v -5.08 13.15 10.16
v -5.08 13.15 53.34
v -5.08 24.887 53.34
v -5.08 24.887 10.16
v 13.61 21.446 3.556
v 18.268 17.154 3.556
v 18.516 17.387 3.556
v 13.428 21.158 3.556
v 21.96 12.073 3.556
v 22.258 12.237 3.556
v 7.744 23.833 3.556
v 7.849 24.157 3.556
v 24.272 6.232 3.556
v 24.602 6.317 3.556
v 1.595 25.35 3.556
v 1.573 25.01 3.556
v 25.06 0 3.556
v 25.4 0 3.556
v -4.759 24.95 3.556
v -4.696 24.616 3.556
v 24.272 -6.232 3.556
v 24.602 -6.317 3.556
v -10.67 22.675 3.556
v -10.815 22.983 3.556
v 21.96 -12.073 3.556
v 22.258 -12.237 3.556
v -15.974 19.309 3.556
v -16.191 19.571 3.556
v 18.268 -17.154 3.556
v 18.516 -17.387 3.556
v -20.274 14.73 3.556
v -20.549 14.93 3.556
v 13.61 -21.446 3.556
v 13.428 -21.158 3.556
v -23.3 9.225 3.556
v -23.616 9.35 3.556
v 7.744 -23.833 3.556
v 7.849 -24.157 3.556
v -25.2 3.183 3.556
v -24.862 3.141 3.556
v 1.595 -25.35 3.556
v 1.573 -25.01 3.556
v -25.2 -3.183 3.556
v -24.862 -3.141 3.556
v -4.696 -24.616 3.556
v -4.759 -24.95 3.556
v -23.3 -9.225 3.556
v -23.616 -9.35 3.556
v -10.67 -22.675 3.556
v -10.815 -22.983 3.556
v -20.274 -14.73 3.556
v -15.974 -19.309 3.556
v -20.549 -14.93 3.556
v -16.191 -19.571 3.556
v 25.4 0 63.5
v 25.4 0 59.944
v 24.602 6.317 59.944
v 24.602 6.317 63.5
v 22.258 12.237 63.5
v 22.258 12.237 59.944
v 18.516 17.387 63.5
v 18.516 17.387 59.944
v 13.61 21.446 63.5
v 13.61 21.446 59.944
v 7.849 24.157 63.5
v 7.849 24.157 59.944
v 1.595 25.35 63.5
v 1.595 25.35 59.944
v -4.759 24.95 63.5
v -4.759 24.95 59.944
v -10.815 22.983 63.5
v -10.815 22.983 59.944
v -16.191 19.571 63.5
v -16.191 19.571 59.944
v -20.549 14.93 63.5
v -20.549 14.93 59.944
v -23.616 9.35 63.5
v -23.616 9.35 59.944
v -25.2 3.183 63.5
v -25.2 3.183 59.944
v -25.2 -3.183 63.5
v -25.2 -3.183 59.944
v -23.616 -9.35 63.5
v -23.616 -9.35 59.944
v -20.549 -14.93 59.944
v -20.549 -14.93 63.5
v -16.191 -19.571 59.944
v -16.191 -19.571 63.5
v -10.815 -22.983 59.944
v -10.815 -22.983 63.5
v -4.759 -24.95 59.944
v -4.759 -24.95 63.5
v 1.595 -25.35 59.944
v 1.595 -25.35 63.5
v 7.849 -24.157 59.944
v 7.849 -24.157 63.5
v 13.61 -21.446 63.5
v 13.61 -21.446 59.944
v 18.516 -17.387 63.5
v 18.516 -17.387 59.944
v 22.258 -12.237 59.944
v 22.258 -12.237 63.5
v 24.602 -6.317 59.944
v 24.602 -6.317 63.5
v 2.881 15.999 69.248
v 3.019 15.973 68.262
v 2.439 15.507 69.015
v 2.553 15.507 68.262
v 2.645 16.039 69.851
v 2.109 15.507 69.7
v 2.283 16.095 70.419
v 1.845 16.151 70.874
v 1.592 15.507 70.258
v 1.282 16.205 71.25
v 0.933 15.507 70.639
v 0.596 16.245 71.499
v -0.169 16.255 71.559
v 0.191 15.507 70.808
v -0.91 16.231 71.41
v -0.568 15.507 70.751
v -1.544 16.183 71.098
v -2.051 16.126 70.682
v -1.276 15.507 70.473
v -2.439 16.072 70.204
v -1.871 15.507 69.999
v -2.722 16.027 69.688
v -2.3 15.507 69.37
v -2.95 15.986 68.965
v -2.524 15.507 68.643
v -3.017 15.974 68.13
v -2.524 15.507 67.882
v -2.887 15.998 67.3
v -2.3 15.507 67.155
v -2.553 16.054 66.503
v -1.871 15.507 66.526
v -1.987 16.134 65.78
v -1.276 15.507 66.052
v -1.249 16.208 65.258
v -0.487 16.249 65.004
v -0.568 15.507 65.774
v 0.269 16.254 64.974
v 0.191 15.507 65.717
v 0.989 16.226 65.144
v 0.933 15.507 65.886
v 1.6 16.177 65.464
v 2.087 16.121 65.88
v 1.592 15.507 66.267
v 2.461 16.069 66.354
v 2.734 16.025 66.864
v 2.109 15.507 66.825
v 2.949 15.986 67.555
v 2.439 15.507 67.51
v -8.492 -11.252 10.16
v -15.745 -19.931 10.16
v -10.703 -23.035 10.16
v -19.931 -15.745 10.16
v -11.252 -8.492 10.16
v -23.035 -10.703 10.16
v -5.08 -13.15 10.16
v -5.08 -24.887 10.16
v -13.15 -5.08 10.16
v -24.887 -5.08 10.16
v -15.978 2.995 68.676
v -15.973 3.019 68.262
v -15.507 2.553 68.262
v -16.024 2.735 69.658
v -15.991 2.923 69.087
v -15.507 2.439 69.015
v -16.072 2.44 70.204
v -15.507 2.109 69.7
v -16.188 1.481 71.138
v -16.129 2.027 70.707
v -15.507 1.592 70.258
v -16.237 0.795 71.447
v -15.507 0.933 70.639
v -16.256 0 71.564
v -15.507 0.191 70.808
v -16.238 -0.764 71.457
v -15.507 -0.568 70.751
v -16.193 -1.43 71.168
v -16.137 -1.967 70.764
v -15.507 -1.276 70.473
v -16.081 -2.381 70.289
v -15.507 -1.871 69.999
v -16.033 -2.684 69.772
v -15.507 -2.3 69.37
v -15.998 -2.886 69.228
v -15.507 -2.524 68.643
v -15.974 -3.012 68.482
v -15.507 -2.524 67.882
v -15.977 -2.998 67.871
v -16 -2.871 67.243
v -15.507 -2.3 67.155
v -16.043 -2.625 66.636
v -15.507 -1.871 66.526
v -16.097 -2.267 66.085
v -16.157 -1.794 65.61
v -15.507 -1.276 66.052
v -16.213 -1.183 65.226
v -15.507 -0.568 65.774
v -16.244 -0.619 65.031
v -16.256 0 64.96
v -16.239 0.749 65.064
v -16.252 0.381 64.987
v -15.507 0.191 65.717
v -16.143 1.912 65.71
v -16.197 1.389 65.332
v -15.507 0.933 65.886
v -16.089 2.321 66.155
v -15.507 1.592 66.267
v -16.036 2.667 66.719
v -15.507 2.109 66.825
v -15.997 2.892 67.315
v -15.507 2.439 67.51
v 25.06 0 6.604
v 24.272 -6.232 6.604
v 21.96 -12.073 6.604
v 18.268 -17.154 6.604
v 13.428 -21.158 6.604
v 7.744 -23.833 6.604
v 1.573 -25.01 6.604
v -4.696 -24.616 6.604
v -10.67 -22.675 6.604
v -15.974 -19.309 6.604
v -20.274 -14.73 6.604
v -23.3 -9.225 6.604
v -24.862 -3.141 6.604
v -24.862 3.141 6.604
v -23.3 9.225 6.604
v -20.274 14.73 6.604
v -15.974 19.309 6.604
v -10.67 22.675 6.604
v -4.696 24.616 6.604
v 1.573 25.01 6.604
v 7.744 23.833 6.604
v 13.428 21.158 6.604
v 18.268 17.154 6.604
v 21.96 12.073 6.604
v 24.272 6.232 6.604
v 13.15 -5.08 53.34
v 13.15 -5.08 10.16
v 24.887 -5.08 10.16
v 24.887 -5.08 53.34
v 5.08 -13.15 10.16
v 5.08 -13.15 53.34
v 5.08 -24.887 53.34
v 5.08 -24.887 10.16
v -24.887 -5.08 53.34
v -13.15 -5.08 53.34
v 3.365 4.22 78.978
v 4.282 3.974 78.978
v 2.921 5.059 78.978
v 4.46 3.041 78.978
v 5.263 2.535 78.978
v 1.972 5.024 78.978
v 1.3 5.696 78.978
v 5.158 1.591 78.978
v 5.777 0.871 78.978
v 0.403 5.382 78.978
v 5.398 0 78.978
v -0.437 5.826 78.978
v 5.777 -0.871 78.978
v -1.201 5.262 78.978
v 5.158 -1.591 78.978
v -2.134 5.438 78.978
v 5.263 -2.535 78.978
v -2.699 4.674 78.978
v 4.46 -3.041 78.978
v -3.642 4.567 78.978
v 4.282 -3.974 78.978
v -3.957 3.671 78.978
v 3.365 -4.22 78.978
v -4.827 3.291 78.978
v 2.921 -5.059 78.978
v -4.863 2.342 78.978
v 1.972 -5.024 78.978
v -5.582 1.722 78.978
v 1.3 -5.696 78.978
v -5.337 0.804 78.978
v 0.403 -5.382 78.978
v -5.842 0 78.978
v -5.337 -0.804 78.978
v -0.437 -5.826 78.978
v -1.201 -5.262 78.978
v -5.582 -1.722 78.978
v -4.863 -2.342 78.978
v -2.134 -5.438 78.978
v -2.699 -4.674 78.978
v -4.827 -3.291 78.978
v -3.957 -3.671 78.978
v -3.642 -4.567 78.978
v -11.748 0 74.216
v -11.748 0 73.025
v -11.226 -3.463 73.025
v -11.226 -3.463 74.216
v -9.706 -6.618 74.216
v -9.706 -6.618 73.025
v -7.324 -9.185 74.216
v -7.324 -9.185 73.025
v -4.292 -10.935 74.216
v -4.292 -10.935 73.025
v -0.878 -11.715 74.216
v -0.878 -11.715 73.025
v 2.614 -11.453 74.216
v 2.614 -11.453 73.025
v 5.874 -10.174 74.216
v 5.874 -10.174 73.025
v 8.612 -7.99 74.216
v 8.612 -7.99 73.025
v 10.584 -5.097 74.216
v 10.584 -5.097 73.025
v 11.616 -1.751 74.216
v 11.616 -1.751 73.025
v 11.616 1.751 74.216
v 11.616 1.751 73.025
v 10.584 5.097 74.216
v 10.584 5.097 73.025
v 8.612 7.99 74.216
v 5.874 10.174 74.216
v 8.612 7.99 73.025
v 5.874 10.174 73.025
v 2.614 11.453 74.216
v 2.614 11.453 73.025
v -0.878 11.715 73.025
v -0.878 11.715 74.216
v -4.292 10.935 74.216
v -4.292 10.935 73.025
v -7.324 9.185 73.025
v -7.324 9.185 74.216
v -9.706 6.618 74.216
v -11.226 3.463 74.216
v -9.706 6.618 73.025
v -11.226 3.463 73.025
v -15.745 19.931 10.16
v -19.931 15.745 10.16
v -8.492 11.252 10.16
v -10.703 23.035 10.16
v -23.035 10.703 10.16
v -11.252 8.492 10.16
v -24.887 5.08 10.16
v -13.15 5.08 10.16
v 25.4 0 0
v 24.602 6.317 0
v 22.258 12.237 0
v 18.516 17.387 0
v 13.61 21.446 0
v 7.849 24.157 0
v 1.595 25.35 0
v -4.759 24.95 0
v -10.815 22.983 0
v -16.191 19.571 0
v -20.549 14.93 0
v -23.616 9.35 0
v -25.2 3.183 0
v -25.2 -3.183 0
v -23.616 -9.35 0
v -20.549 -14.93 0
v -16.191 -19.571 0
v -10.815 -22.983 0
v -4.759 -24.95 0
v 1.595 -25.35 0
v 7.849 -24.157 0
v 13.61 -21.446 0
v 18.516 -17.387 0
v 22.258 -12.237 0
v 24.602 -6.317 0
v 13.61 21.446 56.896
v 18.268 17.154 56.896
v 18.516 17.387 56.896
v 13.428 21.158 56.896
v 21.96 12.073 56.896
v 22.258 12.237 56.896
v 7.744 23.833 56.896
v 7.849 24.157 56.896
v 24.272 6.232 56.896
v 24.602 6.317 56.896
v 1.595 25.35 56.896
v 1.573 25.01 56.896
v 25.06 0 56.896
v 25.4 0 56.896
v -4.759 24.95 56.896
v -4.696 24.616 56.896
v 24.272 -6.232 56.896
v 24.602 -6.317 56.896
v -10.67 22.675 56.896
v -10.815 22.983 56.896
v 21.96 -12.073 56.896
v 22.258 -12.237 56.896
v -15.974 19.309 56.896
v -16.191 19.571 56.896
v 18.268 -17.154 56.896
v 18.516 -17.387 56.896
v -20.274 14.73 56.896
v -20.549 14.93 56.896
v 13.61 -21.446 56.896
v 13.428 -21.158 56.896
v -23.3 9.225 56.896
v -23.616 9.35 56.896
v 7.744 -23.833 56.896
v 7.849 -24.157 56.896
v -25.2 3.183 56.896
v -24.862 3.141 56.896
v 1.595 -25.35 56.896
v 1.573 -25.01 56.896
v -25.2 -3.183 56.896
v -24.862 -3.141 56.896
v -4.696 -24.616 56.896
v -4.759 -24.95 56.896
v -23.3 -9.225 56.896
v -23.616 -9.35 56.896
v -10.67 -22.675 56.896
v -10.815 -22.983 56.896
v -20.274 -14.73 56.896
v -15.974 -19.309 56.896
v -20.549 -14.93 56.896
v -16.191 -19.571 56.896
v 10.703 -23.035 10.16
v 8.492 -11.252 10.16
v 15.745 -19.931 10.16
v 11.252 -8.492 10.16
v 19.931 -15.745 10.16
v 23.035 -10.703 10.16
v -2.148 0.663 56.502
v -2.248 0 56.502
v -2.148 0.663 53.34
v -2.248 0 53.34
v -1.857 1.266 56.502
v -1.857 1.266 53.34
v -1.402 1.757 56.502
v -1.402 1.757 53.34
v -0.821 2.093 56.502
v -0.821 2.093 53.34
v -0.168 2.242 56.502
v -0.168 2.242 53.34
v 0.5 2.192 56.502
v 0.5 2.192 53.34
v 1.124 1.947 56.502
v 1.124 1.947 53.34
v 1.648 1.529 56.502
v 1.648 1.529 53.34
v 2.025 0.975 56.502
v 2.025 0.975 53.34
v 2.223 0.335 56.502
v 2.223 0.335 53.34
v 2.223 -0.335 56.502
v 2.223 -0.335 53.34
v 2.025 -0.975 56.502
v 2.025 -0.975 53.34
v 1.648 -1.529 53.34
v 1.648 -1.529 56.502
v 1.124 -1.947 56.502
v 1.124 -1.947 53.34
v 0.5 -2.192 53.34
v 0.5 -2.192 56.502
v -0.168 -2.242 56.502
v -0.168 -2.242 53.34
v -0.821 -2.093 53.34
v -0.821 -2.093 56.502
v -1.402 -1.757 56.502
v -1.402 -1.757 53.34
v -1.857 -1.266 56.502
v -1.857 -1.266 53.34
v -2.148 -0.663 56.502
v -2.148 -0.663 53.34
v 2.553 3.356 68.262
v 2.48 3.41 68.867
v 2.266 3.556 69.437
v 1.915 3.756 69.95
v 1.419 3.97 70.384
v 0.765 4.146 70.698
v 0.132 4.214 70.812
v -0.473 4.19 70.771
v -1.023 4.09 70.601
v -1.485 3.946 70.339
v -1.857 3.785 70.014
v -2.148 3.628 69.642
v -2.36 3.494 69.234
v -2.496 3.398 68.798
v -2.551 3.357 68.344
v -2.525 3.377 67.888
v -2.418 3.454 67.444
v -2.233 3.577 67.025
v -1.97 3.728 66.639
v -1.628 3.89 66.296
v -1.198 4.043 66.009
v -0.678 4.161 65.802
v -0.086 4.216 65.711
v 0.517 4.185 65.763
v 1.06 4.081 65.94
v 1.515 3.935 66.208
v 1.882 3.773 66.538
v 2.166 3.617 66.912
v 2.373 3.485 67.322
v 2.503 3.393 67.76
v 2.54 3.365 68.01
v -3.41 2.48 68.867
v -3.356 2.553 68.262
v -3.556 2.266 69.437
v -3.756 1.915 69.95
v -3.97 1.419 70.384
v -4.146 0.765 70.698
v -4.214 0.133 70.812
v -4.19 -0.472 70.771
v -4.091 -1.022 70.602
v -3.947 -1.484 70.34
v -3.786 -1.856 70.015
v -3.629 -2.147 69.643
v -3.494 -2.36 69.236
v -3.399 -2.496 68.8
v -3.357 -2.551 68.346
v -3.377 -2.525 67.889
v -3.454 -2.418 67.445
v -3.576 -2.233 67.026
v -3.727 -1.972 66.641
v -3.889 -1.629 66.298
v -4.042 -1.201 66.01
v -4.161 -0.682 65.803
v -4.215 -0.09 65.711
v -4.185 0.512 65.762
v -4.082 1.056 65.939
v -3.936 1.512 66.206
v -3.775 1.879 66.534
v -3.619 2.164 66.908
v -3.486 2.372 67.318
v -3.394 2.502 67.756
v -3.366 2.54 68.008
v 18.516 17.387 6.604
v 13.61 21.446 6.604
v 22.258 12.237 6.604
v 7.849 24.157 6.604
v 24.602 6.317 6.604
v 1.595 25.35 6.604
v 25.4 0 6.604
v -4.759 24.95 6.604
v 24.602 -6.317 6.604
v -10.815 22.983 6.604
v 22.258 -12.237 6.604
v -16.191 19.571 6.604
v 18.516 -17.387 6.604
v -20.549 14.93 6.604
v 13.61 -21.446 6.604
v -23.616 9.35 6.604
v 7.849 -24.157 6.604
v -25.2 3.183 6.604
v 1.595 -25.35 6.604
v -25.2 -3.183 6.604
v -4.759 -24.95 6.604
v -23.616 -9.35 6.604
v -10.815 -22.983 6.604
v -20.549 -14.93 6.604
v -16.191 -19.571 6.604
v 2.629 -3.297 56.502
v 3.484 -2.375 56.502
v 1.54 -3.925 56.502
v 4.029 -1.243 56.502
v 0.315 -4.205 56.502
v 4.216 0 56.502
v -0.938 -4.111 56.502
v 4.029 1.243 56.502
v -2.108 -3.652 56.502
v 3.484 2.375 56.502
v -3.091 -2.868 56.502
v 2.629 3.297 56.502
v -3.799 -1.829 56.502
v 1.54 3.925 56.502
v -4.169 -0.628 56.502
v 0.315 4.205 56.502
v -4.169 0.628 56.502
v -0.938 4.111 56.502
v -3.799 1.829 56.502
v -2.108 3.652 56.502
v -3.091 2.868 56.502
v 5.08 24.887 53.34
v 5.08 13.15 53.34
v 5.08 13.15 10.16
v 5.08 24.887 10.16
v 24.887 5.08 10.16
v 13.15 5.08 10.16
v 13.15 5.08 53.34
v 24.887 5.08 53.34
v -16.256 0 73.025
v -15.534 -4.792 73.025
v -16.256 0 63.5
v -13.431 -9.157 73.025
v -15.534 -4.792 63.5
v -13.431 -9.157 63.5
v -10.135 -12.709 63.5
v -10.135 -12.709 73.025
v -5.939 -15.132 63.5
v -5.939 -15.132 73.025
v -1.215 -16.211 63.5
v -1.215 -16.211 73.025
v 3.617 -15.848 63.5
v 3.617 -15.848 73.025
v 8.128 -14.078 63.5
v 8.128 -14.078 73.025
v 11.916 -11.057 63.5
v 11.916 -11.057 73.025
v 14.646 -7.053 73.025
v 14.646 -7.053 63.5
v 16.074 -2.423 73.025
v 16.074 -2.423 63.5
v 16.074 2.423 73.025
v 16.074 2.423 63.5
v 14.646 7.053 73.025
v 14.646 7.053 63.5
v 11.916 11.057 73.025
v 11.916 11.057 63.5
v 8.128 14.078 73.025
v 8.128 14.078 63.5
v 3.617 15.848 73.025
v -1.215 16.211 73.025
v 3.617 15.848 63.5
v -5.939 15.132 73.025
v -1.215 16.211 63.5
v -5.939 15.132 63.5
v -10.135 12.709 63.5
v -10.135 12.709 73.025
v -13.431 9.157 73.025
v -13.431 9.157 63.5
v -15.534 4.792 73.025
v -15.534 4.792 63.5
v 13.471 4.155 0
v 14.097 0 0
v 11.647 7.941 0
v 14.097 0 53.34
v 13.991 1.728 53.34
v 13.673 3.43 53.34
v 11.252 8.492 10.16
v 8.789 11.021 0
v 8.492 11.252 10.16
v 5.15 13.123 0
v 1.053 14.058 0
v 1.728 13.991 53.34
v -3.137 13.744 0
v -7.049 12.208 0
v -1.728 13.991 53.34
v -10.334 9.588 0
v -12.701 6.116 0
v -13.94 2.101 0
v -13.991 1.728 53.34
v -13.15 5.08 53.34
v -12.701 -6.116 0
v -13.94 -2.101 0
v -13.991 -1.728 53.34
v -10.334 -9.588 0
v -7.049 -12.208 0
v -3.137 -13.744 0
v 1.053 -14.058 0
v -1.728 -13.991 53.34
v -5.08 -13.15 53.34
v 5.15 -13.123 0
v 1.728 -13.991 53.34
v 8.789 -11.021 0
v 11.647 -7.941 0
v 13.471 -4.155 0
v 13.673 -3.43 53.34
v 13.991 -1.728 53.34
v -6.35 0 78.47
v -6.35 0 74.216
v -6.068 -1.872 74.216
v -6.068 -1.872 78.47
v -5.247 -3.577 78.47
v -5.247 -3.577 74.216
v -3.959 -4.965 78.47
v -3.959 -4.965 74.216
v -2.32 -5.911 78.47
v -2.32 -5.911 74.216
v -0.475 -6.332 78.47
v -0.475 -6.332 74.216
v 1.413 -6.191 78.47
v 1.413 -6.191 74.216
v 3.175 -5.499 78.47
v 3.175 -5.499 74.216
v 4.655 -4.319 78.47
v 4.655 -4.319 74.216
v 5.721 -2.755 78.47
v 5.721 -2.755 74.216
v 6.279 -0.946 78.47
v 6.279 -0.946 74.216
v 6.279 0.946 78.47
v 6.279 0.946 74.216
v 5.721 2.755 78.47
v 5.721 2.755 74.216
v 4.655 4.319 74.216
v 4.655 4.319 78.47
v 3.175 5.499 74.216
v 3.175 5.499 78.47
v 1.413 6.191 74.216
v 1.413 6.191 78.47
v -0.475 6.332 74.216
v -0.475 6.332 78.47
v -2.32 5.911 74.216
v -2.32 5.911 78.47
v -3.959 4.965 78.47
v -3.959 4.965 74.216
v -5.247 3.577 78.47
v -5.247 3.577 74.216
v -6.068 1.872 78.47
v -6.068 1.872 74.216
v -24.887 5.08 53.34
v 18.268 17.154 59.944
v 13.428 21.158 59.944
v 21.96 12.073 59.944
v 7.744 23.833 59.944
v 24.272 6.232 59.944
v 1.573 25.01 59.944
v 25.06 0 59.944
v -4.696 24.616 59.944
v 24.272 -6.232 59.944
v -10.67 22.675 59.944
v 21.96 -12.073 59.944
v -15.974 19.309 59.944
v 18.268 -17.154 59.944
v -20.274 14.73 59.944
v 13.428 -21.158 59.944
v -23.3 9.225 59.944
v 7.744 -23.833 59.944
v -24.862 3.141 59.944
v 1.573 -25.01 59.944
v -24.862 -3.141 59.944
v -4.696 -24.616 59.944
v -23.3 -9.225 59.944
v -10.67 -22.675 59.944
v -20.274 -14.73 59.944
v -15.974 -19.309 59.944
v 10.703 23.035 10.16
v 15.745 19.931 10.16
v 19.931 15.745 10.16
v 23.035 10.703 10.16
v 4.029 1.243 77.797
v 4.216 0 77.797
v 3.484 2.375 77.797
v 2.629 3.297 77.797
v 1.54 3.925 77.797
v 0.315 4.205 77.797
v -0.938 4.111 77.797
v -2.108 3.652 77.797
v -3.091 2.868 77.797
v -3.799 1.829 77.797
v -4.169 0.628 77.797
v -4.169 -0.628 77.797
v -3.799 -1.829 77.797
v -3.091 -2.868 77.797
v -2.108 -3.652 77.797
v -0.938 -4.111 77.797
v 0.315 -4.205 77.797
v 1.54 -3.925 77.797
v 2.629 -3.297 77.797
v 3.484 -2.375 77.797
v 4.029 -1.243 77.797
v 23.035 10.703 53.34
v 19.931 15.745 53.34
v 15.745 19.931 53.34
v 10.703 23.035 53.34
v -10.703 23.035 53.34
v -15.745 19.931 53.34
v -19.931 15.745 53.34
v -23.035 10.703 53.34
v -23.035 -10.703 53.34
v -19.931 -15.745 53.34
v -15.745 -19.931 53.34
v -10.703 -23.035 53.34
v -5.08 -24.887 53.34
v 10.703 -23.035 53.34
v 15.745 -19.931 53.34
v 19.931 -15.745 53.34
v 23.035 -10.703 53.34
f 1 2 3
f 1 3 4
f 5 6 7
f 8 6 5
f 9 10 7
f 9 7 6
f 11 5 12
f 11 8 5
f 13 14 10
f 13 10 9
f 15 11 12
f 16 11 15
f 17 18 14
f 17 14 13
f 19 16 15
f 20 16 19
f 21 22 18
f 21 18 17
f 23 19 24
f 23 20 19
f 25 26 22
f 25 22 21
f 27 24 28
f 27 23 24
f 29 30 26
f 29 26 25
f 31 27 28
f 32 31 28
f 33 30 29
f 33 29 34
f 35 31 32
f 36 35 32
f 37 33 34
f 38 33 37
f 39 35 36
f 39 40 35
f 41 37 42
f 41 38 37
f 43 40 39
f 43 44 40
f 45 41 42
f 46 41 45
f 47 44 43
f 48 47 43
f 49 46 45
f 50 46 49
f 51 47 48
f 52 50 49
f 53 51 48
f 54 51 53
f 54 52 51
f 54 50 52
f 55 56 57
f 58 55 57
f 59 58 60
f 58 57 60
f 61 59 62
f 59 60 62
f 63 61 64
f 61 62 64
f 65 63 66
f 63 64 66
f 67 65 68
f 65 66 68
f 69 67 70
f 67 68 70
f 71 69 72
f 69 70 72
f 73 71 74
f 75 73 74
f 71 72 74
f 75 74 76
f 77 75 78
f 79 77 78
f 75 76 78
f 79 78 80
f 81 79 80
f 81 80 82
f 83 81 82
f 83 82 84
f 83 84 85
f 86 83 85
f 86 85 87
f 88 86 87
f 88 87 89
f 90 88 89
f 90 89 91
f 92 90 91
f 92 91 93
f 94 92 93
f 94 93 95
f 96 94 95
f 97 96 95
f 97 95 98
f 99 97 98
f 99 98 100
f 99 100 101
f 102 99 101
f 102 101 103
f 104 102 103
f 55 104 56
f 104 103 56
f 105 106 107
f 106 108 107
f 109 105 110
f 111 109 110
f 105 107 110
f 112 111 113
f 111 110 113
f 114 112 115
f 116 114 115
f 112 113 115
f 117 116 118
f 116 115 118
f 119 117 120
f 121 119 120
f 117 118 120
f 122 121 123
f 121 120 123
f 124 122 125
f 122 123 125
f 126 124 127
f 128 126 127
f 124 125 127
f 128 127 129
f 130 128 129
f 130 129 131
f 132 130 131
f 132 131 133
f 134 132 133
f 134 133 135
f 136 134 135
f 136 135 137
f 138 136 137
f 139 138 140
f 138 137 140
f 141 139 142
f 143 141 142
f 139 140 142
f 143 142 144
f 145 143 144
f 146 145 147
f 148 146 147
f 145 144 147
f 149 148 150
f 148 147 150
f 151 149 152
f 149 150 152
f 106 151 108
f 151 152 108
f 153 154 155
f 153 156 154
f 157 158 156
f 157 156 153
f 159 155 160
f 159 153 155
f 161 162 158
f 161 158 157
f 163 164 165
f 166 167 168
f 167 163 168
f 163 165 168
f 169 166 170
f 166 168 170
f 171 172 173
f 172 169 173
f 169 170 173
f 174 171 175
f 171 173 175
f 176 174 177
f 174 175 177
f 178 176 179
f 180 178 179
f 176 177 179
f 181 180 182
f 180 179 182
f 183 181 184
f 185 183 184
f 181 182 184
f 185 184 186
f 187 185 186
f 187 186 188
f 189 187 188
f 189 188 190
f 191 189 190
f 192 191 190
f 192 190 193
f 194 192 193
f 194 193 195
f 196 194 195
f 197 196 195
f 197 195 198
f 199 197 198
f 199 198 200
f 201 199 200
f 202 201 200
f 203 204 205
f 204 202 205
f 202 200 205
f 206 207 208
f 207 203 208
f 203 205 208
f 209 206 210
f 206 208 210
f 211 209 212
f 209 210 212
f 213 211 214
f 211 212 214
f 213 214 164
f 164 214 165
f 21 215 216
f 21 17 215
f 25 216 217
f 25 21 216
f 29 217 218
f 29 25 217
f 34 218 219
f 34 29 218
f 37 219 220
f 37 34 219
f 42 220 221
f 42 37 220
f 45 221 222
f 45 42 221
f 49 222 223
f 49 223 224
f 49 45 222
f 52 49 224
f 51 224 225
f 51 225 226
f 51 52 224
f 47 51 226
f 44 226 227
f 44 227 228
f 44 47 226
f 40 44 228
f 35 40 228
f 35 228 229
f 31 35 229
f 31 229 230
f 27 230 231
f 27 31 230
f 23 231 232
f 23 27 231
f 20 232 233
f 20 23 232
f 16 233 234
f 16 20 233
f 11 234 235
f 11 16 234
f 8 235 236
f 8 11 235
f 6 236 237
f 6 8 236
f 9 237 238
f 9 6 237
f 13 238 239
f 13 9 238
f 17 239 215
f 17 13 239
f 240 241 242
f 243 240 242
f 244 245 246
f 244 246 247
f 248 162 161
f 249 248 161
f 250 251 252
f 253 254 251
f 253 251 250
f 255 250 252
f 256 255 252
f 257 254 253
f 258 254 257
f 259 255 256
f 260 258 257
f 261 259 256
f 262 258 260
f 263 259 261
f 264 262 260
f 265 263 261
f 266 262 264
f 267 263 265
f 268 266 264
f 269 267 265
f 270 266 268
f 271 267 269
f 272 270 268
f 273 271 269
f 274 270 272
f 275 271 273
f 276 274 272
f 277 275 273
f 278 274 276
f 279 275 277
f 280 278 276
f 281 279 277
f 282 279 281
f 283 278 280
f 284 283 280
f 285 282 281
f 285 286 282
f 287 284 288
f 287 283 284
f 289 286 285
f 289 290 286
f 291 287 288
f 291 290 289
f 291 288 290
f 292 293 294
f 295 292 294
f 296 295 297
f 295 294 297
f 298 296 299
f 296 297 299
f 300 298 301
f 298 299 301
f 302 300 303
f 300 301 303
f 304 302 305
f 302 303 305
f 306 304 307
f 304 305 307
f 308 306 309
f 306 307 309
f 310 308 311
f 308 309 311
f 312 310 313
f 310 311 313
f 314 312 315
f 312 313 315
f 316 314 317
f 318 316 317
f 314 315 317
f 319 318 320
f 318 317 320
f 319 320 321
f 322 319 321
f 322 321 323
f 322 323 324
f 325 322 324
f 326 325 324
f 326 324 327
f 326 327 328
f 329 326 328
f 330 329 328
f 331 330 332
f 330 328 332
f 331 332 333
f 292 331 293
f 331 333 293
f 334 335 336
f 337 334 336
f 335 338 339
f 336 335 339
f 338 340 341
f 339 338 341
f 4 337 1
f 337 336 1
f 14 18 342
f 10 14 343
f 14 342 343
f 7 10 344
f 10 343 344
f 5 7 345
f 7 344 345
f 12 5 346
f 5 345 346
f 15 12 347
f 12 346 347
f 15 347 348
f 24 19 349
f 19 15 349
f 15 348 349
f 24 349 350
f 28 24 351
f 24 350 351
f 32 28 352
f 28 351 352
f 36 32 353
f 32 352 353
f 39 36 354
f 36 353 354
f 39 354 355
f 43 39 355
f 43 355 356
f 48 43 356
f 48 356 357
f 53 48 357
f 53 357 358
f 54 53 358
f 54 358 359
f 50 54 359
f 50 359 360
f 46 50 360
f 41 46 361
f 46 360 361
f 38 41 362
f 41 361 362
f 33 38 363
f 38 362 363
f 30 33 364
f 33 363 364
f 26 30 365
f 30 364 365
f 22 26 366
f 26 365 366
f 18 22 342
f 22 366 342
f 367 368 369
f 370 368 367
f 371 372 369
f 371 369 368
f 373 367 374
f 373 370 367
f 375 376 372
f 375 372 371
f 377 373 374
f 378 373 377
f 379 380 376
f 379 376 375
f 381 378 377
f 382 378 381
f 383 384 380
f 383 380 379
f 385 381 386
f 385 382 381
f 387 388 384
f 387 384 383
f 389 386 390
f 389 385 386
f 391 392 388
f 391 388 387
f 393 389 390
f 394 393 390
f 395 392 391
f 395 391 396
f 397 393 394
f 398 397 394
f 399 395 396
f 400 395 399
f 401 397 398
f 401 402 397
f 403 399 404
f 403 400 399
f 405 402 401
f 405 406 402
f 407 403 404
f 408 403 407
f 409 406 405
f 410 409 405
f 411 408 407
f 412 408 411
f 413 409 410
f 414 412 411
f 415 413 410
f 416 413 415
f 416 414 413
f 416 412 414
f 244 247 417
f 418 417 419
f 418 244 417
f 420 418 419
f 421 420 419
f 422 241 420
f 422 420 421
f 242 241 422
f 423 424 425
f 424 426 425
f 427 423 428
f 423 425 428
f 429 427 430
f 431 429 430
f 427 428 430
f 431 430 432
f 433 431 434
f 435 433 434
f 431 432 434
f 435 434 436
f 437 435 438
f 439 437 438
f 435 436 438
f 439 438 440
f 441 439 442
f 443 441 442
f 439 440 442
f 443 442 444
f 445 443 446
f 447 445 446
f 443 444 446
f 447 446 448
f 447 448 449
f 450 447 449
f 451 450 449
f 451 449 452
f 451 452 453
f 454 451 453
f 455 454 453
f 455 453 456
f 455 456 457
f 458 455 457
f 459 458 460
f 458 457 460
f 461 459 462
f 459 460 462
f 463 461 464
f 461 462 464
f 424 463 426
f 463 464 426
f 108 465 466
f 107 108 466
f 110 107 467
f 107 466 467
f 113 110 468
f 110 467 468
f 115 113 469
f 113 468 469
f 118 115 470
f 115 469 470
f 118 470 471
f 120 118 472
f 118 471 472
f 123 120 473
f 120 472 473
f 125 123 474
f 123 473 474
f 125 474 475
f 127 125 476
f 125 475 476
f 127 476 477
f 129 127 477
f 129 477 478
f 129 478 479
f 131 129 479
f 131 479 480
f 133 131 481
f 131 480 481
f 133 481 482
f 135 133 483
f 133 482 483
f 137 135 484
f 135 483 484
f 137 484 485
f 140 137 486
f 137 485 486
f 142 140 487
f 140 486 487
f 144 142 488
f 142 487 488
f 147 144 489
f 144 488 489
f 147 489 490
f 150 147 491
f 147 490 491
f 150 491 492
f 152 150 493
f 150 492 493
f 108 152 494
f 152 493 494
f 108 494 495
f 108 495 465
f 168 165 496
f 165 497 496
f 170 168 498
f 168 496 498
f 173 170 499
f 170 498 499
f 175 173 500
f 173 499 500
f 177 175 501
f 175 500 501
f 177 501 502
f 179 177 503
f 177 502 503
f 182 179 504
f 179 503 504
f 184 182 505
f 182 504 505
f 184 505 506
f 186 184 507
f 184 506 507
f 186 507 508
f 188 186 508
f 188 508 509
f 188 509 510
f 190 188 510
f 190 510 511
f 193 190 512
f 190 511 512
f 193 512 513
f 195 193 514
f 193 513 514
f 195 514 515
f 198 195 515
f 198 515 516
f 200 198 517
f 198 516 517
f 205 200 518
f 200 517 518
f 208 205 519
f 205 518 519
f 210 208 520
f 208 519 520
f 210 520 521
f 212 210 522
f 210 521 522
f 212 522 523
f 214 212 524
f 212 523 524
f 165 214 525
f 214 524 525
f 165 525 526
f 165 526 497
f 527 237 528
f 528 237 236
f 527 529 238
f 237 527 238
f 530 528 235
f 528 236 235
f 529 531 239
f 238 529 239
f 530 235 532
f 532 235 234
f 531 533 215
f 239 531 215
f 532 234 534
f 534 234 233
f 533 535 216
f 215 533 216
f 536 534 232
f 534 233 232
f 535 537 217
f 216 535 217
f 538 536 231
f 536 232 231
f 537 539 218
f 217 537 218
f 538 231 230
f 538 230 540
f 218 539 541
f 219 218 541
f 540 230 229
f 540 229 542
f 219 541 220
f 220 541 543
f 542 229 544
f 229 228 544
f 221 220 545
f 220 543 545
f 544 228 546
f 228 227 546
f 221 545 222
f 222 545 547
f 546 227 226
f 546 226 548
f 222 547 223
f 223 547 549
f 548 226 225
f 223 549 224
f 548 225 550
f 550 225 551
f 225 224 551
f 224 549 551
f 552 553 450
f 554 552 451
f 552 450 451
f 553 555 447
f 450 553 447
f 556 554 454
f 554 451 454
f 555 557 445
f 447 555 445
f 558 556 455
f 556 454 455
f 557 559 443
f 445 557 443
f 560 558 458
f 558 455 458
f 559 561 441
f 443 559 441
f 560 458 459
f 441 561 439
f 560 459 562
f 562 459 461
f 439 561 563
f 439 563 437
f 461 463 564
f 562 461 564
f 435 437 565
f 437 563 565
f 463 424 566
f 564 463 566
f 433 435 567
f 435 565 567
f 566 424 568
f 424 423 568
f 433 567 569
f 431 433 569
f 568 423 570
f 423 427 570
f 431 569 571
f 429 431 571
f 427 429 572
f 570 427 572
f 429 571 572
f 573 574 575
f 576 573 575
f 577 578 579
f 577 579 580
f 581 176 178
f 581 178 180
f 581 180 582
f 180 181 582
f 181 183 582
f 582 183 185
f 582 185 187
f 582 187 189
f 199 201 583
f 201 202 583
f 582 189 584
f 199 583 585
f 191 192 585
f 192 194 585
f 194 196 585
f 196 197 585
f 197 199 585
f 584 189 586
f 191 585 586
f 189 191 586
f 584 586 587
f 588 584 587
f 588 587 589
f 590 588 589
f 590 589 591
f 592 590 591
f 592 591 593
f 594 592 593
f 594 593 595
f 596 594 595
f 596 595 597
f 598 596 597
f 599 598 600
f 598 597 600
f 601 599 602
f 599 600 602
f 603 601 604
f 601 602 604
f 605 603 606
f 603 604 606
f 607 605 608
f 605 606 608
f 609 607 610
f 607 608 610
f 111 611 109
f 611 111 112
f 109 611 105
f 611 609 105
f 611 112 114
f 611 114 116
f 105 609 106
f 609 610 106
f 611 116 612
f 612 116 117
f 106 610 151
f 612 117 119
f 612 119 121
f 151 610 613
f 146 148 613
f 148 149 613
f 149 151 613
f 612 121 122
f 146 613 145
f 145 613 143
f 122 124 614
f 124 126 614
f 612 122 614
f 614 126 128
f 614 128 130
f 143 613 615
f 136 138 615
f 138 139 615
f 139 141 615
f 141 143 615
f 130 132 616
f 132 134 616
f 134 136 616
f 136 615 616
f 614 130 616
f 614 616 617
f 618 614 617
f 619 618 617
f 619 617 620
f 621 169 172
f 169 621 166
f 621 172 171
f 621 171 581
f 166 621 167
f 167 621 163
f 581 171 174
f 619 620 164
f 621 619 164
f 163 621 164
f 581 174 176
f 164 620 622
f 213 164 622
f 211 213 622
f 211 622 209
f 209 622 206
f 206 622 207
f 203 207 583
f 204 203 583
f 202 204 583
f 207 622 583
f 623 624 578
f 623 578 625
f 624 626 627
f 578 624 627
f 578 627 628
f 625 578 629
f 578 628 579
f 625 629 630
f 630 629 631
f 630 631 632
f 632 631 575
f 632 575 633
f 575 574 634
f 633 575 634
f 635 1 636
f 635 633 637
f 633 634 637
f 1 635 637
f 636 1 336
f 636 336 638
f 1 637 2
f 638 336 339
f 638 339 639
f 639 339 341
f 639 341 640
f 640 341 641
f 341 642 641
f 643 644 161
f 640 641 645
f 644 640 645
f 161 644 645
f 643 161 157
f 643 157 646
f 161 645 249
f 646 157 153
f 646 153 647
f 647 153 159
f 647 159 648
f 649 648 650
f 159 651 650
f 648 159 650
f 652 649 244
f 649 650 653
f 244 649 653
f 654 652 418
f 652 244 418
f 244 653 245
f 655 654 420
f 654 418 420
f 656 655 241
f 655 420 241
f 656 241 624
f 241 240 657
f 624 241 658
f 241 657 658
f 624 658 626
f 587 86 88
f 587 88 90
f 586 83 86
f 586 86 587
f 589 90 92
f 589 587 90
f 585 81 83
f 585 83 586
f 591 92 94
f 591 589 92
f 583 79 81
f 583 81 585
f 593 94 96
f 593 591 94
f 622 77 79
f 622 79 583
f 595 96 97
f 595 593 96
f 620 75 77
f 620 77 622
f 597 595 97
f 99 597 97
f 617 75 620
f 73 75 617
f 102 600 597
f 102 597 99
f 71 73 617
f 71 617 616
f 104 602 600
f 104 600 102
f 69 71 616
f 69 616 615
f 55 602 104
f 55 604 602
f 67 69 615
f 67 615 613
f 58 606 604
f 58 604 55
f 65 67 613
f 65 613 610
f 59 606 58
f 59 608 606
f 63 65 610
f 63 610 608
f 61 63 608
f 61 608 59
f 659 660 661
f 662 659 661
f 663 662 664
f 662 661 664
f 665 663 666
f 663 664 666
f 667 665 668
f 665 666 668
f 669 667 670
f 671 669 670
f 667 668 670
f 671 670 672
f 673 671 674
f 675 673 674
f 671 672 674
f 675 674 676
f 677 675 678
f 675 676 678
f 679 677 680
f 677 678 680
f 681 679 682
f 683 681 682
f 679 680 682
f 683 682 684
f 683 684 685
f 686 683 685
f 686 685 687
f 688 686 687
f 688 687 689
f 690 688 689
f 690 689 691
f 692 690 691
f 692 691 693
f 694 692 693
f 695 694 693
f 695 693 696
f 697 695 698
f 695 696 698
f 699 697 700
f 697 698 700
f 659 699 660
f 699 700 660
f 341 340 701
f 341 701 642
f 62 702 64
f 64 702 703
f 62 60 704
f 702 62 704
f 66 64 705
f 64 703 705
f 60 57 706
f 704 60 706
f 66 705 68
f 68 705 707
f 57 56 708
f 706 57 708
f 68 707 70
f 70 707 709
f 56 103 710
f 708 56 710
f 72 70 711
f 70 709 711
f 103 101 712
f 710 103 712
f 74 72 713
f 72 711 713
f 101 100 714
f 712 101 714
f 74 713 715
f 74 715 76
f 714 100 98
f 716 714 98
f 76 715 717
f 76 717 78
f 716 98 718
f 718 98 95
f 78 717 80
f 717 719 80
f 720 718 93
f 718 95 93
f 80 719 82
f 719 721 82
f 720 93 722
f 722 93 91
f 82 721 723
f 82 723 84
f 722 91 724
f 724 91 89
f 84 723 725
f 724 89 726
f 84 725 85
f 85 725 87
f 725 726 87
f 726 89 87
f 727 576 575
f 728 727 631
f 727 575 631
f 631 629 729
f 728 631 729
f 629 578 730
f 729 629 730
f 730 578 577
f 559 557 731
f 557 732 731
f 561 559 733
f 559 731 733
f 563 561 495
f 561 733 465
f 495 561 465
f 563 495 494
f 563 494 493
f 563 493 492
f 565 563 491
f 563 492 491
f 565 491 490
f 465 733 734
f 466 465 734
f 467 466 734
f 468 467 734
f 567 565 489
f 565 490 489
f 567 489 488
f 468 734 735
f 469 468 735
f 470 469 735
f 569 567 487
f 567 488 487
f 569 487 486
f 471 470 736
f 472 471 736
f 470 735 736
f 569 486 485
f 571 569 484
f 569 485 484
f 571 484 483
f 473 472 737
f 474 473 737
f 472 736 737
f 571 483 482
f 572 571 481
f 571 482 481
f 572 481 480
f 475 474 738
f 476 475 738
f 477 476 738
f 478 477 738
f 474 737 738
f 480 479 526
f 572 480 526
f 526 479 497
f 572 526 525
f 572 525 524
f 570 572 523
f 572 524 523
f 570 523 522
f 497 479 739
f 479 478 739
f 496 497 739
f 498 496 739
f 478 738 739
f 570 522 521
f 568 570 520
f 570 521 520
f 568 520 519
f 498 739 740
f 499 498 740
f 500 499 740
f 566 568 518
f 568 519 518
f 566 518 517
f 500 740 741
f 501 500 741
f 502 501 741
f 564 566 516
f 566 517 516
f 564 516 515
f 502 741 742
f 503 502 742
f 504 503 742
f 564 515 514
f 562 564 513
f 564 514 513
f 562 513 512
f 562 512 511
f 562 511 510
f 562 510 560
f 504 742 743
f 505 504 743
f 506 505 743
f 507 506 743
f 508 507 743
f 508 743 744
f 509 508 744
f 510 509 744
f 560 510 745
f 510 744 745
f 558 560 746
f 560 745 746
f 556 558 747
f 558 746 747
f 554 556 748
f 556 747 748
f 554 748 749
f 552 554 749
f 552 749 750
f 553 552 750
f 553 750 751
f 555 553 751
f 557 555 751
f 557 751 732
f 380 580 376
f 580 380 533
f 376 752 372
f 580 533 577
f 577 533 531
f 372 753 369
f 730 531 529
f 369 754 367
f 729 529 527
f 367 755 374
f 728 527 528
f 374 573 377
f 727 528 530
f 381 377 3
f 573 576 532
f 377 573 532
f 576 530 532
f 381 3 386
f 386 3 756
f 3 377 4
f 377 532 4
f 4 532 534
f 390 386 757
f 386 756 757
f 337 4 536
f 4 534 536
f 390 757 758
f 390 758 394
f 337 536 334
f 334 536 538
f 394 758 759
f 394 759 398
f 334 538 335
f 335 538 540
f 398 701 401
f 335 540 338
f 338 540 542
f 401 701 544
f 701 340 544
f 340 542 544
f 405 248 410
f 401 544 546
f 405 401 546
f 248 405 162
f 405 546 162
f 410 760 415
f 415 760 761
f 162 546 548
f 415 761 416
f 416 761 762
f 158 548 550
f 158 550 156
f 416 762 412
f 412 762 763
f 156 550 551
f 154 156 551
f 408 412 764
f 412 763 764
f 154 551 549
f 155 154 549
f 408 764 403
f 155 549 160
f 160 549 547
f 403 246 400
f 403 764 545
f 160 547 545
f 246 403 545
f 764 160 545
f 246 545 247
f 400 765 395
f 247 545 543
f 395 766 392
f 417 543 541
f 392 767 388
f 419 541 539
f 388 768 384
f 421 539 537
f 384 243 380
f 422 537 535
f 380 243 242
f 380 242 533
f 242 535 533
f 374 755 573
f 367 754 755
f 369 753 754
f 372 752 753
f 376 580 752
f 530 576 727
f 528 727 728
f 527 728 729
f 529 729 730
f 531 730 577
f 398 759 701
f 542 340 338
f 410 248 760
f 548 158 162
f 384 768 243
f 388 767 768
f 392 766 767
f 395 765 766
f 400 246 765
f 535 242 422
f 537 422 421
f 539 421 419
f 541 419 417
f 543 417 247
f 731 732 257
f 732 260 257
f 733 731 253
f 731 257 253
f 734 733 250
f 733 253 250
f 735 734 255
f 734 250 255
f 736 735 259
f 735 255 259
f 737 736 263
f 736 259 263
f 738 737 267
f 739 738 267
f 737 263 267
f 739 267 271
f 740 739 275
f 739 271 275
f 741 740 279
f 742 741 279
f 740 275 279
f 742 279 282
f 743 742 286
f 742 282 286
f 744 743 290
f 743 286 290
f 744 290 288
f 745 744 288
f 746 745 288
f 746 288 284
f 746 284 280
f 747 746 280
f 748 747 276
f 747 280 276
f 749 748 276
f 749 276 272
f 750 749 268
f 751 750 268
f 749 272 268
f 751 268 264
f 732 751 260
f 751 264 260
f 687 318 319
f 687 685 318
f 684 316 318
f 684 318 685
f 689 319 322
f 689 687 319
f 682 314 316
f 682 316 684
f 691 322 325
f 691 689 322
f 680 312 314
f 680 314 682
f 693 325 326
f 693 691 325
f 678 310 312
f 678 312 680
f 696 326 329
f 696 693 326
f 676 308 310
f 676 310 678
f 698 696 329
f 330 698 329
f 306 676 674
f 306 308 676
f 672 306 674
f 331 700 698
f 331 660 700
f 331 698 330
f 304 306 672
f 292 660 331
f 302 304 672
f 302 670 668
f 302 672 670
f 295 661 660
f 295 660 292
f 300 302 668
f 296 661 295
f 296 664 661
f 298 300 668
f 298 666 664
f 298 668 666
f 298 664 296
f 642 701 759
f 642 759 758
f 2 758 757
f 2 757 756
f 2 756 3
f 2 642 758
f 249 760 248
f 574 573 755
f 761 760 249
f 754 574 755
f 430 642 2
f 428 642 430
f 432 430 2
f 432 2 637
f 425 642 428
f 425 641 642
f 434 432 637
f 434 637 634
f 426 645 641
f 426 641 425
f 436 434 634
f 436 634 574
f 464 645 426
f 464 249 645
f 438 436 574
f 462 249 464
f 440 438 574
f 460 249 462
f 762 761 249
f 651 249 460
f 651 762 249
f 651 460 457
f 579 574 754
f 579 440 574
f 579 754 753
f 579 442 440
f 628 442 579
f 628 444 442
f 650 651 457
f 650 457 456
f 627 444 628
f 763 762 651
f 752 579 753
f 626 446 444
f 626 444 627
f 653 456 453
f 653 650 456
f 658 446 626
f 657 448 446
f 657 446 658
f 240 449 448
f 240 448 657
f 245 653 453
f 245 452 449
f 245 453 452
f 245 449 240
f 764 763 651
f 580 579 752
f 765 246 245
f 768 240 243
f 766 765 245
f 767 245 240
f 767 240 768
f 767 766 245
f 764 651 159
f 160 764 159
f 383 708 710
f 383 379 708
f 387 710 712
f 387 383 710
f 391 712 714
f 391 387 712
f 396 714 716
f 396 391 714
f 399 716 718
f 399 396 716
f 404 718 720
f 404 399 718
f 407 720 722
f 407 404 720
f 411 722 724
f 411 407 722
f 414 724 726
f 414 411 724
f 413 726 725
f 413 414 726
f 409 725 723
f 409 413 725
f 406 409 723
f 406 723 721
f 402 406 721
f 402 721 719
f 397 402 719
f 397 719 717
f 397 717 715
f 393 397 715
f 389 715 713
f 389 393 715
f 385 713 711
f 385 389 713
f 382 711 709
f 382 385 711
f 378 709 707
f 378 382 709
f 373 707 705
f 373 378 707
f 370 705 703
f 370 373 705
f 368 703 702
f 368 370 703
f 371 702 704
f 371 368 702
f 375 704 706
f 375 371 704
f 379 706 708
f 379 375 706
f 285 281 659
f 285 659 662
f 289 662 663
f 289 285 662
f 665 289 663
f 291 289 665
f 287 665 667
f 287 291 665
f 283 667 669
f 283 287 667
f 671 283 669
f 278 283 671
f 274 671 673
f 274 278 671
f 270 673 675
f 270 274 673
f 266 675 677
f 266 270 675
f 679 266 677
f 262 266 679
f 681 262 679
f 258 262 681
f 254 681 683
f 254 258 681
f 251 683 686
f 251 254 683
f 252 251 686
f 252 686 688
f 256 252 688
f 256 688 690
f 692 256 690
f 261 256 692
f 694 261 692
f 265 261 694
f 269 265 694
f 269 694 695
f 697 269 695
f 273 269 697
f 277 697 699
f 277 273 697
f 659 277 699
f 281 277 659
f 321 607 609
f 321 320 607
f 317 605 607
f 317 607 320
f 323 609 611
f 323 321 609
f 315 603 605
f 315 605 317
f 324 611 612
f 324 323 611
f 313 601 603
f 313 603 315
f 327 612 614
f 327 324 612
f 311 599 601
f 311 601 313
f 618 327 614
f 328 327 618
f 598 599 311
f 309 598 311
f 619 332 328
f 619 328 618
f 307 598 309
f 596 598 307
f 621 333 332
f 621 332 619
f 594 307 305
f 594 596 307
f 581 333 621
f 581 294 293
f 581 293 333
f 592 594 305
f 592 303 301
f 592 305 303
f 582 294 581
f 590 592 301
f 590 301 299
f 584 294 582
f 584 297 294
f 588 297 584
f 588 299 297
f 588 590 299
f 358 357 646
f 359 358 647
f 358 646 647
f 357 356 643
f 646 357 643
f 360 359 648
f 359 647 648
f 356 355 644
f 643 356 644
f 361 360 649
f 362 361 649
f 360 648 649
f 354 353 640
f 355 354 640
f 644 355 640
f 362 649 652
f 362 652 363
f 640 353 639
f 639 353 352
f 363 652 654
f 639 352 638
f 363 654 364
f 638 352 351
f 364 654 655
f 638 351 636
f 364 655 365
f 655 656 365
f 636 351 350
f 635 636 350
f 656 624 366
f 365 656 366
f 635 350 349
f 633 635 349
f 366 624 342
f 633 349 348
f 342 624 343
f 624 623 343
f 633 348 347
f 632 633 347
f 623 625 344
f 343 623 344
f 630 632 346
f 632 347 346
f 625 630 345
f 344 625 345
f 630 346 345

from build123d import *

# Parameters (mm, degrees)
SKETCH1_R                                      = 25.4
BOSS_EXTRUDE1_DEPTH                            = 63.5
SKETCH2_R                                      = 14.097
CUT_EXTRUDE1_DEPTH                             = 63.5
SKETCH4_W                                      = 20.32
SKETCH4_H                                      = 43.18
CUT_EXTRUDE3_DEPTH                             = 75.876167103
SKETCH8_R                                      = 14.097
BOSS_EXTRUDE3_DEPTH                            = 10.16
SKETCH10_R                                     = 16.256
BOSS_EXTRUDE4_DEPTH                            = 9.525
SKETCH26_R                                     = 11.7475
BOSS_EXTRUDE8_DEPTH                            = 1.190625
SKETCH11_R                                     = 6.35
BOSS_EXTRUDE5_DEPTH                            = 4.7625
CBORE_FOR_8_SOCKET_HEAD_CAP_SCREW1_D           = 4.4958
CBORE_FOR_8_SOCKET_HEAD_CAP_SCREW1_CBORE_D     = 7.9375
CBORE_FOR_8_SOCKET_HEAD_CAP_SCREW1_CBORE_DEPTH = 22.475825
SKETCH17_W                                     = 3.048
SKETCH17_H                                     = 0.508
CIRPATTERN1_COUNT                              = 2
CIRPATTERN1_ANGLE                              = 90
CHAMFER1_SIZE                                  = 0.508


# Read off the part's stored shape, not the designer's step: 1/4-20 Tapped Hole1, 3/8-24 Tapped Hole1
with BuildPart() as part:
    # Sketch1 → Boss-Extrude1 (new body)
    with BuildSketch(Plane.XY):
        Circle(SKETCH1_R)
    extrude(amount=BOSS_EXTRUDE1_DEPTH)

    # Sketch2 → Cut-Extrude1 (cut)
    with BuildSketch(Plane.XY.offset(63.5)):
        Circle(SKETCH2_R)
    extrude(amount=-CUT_EXTRUDE1_DEPTH, mode=Mode.SUBTRACT)

    # Sketch4 → Cut-Extrude3 (cut, through all)
    with BuildSketch(Plane(origin=(0, 5.08, 0), x_dir=(1, 0, 0), z_dir=(0, 1, 0))):
        with Locations((-15.24, -31.75)):
            Rectangle(SKETCH4_W, SKETCH4_H)
        with Locations((15.24, -31.75)):
            Rectangle(SKETCH4_W, SKETCH4_H)
    cut_extrude3 = extrude(amount=CUT_EXTRUDE3_DEPTH, mode=Mode.SUBTRACT)

    # Mirror1: Cut-Extrude3 across plane
    add(cut_extrude3.mirror(Plane.ZX), mode=Mode.SUBTRACT)

    # Sketch8 → Boss-Extrude3 (add)
    with BuildSketch(Plane.XY.offset(63.5)):
        Circle(SKETCH8_R)
    extrude(amount=-BOSS_EXTRUDE3_DEPTH)

    # Sketch10 → Boss-Extrude4 (add)
    with BuildSketch(Plane.XY.offset(63.5)):
        with Locations(Location((0, 0, 0), (0, 0, 180))):
            Circle(SKETCH10_R)
    extrude(amount=BOSS_EXTRUDE4_DEPTH)

    # Sketch26 → Boss-Extrude8 (add)
    with BuildSketch(Plane.XY.offset(73.025)):
        with Locations(Location((0, 0, 0), (0, 0, 180))):
            Circle(SKETCH26_R)
    extrude(amount=BOSS_EXTRUDE8_DEPTH)

    # Sketch11 → Boss-Extrude5 (add)
    with BuildSketch(Plane.XY.offset(74.215625)):
        with Locations(Location((0, 0, 0), (0, 0, 180))):
            Circle(SKETCH11_R)
    extrude(amount=BOSS_EXTRUDE5_DEPTH)

    # CBORE for #8 Socket Head Cap Screw1 (through all)
    with Locations(Plane.XY.offset(78.978125)):
        with Locations((0, 0)):
            CounterBoreHole(CBORE_FOR_8_SOCKET_HEAD_CAP_SCREW1_D / 2, CBORE_FOR_8_SOCKET_HEAD_CAP_SCREW1_CBORE_D / 2, CBORE_FOR_8_SOCKET_HEAD_CAP_SCREW1_CBORE_DEPTH)

    # Sketch17 → Cut-Revolve5 (revolve, cut)
    with BuildSketch(Plane(origin=(0, 0, 0), x_dir=(0, 0, -1), z_dir=(1, 0, 0)), mode=Mode.PRIVATE) as cut_revolve5_sk:
        with Locations((-58.42, 25.313514496)):
            Rectangle(SKETCH17_W, SKETCH17_H)
        with Locations((-5.08, 25.313514496)):
            Rectangle(SKETCH17_W, SKETCH17_H)
    revolve(cut_revolve5_sk.sketch.rotate(Axis((0, 0, 78.978125), (0, 0, -1)), 90), axis=Axis((0, 0, 78.978125), (0, 0, -1)), mode=Mode.SUBTRACT)

    # 1/4-20 Tapped Hole1 outline → 1/4-20 Tapped Hole1 (revolve, cut)
    with BuildSketch(Plane.YX.offset(-68.2625)):
        Polygon((0, -16.256120693), (3.302120693, -16.256120693), (2.5527, -15.5067), (2.5527, -3.038383775), (0, -3.038383775), align=None)
    f_1_4_20_tapped_hole1 = revolve(axis=Axis((0, 0, 68.2625), (1, 0, 0)), mode=Mode.SUBTRACT)

    # 3/8-24 Tapped Hole1 outline → 3/8-24 Tapped Hole1 (revolve, cut)
    with BuildSketch(Plane.XZ):
        Polygon((3.96875, 56.5023), (4.2164, 56.5023), (4.2164, 77.797025), (5.3975, 78.978125), (3.96875, 78.978125), align=None)
    revolve(axis=Axis((0, 0, 0), (0, 0, 1)), mode=Mode.SUBTRACT)

    # CirPattern1: 1/4-20 Tapped Hole1 ×2 about axis
    cirpattern1_axis = Axis((0, 0, 73.025), (0, 0, -1))
    for i in range(1, CIRPATTERN1_COUNT):
        add(f_1_4_20_tapped_hole1.rotate(cirpattern1_axis, i * CIRPATTERN1_ANGLE / (CIRPATTERN1_COUNT - 1)), mode=Mode.SUBTRACT)

    # Chamfer1
    chamfer1_edges = [part.edges().sort_by_distance(p)[0] for p in [
        (6.35, 0, 78.978125),
    ]]
    chamfer(chamfer1_edges, length=CHAMFER1_SIZE)


solid = part.part
